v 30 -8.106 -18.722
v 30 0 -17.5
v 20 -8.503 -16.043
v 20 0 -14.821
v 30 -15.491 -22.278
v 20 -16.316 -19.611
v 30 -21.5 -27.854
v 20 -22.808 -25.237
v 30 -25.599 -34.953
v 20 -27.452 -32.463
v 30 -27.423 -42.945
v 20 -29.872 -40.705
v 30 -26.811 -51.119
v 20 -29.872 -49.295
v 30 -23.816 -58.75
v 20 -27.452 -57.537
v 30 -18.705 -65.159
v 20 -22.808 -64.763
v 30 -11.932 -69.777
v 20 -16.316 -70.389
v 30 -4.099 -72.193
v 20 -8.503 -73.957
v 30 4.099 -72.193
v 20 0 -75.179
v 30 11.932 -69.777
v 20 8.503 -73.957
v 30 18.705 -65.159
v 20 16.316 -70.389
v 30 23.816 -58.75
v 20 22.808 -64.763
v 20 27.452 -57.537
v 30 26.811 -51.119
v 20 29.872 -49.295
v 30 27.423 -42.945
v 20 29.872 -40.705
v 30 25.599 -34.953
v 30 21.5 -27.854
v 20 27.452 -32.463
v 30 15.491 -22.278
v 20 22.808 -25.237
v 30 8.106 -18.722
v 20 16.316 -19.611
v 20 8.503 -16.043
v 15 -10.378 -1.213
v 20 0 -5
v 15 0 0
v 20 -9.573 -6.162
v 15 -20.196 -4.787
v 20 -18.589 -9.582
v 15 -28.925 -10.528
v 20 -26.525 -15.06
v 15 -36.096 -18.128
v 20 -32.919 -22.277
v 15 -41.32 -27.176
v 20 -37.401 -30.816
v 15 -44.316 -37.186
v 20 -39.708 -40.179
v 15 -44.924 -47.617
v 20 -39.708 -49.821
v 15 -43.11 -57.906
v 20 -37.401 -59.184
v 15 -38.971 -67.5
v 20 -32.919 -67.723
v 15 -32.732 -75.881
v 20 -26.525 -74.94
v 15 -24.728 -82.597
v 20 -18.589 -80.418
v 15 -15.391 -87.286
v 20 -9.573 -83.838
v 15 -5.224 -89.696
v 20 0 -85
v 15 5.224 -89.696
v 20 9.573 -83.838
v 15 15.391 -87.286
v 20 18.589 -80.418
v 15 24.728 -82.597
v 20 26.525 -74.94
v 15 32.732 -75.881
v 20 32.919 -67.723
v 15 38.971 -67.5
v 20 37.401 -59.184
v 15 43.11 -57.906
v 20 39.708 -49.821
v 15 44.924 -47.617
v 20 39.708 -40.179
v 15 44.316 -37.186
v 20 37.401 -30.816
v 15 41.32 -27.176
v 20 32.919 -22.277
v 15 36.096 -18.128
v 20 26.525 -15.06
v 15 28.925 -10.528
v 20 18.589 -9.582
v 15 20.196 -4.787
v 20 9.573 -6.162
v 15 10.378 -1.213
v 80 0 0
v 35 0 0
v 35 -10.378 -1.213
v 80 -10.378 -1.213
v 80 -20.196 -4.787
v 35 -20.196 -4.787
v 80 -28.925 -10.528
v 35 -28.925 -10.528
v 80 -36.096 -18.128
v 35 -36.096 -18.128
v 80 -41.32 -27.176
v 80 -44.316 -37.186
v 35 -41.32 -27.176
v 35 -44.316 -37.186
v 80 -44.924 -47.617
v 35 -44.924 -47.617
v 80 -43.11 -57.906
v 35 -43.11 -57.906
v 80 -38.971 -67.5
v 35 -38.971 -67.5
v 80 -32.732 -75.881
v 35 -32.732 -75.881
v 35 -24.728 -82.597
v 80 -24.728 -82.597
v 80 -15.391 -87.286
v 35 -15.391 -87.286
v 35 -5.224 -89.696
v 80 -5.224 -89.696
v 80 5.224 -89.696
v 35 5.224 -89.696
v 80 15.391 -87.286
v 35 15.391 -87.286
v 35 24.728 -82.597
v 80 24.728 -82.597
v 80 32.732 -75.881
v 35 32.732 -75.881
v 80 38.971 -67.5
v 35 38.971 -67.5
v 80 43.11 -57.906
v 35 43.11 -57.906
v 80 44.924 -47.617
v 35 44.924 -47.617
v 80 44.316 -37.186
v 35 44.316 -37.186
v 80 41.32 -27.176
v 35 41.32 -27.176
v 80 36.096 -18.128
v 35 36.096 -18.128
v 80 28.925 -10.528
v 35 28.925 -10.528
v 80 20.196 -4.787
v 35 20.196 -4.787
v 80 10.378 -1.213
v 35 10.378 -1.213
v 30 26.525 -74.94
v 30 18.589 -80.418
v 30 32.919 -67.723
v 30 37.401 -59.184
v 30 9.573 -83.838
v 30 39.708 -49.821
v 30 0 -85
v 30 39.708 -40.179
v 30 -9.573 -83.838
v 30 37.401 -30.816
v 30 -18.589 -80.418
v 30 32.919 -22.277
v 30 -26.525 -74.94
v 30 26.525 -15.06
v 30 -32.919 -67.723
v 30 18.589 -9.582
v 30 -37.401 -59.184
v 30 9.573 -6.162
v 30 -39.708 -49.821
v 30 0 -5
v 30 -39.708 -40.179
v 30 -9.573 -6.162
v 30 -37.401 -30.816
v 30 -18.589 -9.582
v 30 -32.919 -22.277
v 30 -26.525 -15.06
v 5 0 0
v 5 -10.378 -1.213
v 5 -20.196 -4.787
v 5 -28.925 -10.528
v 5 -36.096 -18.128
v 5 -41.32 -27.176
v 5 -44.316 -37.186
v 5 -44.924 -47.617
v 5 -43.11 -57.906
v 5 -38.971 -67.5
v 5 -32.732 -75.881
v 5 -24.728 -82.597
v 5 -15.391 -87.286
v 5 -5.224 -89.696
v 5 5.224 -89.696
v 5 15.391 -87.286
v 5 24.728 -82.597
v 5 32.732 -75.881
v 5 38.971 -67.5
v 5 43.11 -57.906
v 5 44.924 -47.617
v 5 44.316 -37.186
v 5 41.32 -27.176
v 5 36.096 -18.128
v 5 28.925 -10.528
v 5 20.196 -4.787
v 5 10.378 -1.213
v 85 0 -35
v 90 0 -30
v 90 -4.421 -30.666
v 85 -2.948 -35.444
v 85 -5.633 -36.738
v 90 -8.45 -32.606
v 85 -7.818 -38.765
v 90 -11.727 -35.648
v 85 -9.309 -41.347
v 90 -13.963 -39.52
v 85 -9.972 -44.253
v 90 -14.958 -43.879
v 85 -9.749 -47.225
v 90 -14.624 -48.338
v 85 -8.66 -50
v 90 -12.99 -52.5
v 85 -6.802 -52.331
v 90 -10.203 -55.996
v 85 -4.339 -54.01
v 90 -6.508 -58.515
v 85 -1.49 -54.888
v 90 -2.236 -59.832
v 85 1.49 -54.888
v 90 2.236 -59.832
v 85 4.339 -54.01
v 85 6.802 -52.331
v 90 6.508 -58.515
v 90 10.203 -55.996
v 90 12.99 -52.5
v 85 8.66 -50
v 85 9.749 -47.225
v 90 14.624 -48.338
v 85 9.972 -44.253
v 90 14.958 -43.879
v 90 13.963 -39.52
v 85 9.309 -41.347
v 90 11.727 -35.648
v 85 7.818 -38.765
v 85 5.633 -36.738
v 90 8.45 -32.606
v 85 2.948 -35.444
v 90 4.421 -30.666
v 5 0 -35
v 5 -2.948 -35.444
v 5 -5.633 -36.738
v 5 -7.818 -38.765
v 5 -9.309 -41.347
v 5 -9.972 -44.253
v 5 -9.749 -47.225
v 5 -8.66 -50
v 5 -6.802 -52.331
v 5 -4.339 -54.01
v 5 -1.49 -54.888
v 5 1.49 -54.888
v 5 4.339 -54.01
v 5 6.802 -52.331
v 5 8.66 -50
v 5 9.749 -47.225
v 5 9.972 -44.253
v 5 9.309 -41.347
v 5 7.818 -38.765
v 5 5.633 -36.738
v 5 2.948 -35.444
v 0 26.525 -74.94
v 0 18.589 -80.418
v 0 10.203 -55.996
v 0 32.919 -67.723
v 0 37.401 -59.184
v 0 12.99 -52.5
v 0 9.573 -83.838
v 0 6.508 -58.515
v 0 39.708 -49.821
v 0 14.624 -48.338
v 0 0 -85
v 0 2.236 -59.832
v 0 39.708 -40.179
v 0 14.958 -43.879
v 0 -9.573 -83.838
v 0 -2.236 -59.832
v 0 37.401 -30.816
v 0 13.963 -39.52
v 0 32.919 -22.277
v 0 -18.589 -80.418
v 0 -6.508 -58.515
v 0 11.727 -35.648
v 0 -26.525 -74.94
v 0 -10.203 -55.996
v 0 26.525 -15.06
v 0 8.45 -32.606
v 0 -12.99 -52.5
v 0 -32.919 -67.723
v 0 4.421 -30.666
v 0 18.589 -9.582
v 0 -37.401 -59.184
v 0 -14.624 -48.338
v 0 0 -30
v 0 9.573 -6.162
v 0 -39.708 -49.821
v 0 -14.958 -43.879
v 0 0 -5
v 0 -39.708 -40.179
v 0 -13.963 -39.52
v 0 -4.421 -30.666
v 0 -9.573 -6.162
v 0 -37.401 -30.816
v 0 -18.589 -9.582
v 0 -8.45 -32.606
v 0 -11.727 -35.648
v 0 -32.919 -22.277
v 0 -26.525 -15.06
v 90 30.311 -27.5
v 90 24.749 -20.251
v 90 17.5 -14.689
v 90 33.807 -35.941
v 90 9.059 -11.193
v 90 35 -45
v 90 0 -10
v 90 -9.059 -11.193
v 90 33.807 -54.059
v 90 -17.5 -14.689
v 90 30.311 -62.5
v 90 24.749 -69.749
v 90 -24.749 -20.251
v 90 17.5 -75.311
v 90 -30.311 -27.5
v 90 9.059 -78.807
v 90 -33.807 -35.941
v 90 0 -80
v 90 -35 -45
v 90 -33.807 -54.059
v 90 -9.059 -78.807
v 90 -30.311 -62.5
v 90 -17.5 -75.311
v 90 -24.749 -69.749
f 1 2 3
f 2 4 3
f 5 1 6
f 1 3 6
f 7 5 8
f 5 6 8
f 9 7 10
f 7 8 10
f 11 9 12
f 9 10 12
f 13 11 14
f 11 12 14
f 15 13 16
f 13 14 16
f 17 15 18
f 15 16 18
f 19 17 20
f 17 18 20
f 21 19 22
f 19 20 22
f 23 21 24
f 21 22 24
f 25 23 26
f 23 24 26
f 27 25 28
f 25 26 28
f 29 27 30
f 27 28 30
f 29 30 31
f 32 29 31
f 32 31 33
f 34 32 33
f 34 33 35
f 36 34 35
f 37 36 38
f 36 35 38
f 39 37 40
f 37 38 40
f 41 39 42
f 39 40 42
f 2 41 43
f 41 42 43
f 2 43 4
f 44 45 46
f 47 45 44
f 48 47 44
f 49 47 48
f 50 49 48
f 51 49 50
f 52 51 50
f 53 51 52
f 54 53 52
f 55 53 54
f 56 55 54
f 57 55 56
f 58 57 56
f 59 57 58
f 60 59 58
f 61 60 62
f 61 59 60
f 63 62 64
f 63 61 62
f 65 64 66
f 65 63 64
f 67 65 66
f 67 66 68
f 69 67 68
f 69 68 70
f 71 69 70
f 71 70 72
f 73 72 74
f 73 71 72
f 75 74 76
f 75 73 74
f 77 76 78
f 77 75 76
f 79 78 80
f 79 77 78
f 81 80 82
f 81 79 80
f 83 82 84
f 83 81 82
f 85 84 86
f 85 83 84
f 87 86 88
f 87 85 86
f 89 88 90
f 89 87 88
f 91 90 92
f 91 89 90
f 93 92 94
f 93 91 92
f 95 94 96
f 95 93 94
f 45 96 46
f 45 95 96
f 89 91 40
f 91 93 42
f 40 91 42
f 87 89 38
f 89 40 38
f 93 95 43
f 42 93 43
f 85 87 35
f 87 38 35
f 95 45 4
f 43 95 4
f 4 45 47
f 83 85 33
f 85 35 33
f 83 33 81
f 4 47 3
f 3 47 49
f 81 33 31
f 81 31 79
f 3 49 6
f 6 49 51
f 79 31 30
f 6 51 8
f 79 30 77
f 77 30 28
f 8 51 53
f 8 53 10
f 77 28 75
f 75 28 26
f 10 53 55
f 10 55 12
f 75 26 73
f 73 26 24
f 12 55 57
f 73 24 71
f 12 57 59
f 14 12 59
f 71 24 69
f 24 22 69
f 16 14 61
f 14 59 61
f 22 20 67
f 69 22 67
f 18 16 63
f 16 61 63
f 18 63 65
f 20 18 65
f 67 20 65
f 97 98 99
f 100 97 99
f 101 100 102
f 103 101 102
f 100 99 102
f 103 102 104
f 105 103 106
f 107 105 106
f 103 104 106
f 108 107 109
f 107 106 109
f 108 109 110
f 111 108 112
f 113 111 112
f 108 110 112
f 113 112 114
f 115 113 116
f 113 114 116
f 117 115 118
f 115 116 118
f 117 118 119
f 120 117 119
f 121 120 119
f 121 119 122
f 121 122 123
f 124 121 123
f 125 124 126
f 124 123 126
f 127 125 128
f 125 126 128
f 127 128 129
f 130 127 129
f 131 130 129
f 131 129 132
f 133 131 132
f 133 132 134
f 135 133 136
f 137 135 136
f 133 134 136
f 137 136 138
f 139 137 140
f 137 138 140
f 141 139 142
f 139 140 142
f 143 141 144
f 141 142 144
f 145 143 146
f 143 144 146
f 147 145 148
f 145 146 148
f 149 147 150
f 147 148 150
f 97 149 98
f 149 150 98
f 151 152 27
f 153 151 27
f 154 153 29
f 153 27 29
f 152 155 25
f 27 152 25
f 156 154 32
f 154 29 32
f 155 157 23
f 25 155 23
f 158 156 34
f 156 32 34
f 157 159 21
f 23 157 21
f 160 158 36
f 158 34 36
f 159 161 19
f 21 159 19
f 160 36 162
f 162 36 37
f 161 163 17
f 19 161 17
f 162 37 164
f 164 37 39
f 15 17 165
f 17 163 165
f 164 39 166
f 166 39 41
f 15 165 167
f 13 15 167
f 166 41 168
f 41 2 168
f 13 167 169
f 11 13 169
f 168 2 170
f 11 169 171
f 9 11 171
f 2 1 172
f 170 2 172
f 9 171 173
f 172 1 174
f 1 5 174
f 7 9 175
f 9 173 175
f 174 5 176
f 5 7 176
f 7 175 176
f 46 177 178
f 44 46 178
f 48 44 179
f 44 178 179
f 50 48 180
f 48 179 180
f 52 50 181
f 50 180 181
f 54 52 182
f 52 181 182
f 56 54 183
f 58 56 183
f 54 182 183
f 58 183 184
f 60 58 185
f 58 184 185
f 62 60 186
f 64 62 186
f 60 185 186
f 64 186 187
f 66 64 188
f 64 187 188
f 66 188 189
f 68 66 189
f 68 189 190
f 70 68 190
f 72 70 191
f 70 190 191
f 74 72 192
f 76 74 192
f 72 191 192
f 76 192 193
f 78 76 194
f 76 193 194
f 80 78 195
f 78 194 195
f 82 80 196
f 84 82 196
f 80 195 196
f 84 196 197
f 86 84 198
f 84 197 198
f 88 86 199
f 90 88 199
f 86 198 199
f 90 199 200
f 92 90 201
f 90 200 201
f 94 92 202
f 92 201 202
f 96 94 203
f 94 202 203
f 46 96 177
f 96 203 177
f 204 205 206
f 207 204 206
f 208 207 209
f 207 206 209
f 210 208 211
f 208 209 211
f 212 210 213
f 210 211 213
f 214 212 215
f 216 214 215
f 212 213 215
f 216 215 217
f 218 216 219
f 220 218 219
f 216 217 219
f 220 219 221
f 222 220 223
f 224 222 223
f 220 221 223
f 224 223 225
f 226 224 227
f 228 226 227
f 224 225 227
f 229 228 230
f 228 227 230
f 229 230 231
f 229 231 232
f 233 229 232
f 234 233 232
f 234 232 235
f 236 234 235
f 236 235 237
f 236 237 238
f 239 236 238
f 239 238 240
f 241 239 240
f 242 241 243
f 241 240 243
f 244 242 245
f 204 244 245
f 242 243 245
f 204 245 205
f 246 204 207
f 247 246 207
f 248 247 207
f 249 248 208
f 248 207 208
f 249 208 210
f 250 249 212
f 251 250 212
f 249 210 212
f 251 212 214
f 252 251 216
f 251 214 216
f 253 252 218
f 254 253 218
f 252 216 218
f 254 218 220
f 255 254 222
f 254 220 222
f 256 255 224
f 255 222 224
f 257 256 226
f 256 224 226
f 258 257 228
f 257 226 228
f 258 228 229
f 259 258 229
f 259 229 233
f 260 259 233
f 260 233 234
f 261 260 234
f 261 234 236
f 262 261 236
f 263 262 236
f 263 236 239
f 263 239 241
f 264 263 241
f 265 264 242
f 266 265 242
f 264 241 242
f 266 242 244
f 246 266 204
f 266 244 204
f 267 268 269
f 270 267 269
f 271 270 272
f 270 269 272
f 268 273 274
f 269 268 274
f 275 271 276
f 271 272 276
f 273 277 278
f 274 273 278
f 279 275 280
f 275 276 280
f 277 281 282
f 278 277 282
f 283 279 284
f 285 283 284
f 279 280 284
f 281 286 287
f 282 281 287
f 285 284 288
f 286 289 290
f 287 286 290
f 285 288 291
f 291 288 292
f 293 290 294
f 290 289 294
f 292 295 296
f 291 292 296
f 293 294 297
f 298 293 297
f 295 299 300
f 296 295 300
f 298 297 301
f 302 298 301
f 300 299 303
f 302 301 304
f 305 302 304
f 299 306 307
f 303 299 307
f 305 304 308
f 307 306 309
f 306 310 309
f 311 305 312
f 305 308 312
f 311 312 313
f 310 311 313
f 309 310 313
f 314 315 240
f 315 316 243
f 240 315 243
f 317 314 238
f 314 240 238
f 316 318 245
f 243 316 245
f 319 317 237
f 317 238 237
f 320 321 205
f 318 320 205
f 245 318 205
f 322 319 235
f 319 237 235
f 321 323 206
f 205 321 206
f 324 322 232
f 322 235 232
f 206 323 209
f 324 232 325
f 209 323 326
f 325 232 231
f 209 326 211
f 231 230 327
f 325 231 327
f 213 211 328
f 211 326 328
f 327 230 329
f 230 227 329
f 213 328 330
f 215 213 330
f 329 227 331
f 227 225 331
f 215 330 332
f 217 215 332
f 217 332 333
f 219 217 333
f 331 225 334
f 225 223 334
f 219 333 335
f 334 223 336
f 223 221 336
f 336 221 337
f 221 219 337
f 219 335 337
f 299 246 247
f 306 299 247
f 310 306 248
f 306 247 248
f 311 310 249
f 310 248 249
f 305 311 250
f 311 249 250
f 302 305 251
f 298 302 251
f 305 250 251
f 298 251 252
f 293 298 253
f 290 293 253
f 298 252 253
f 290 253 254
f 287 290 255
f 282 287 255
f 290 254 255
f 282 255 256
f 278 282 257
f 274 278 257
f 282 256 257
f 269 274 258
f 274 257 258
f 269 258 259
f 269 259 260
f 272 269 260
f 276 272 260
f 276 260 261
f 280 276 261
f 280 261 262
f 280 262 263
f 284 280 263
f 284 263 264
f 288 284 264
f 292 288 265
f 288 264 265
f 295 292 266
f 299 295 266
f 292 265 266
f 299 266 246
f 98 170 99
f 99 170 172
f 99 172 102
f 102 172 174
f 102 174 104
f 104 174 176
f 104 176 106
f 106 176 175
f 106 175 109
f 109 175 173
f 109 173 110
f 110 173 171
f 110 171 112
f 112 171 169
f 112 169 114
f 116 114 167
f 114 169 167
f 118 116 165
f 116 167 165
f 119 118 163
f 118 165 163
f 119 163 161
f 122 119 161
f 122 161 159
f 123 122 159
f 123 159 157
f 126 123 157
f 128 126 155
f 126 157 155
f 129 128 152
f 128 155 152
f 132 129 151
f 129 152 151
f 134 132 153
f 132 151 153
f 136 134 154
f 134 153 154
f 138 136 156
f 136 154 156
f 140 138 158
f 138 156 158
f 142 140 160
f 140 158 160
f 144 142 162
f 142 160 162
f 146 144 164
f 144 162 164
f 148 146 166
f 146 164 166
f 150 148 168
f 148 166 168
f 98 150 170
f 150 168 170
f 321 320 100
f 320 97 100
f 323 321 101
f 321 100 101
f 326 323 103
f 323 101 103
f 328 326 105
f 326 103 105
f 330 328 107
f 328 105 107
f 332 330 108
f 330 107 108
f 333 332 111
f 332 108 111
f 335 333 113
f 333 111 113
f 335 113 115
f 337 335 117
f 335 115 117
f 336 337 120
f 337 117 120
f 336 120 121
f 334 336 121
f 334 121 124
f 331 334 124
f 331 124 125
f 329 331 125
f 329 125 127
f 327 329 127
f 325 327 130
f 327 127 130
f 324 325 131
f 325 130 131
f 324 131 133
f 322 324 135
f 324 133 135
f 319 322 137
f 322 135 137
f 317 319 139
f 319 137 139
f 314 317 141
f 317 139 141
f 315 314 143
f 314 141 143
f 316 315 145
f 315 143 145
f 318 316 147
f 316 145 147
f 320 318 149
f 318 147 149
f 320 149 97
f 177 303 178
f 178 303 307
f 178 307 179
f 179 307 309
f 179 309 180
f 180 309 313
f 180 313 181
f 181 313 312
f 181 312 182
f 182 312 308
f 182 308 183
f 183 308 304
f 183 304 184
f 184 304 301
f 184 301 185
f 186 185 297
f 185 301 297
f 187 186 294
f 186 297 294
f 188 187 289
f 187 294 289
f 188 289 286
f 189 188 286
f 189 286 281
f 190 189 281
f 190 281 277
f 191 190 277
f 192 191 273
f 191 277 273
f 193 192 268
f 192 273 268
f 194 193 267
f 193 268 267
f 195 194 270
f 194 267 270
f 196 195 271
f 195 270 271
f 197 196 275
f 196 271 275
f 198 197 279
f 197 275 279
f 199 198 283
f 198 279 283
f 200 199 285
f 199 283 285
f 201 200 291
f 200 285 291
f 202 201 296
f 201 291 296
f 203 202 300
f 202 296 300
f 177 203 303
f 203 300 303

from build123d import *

# Parameters (mm, degrees)
F2_SIZE = 5


with BuildPart() as f1:
    # F0 (on Front) → F1 (revolve)
    with BuildSketch(Plane.XZ):
        Polygon((20, 0), (0, 0), (0, -35), (90, -35), (90, -10), (80, 0), (30, 0), (30, -17.5), (20, -14.8205080757), align=None)
    revolve(axis=Axis((44.4514416158, 0, -45), (1, 0, 0)))

    # F2
    f2_edges = [f1.edges().sort_by_distance(p)[0] for p in [
        (0, 0, -90),
        (20, 0, -90),
        (30, 0, -90),
        (0, 0, -55),
        (90, 0, -55),
    ]]
    chamfer(f2_edges, length=F2_SIZE)


solid = f1.part
